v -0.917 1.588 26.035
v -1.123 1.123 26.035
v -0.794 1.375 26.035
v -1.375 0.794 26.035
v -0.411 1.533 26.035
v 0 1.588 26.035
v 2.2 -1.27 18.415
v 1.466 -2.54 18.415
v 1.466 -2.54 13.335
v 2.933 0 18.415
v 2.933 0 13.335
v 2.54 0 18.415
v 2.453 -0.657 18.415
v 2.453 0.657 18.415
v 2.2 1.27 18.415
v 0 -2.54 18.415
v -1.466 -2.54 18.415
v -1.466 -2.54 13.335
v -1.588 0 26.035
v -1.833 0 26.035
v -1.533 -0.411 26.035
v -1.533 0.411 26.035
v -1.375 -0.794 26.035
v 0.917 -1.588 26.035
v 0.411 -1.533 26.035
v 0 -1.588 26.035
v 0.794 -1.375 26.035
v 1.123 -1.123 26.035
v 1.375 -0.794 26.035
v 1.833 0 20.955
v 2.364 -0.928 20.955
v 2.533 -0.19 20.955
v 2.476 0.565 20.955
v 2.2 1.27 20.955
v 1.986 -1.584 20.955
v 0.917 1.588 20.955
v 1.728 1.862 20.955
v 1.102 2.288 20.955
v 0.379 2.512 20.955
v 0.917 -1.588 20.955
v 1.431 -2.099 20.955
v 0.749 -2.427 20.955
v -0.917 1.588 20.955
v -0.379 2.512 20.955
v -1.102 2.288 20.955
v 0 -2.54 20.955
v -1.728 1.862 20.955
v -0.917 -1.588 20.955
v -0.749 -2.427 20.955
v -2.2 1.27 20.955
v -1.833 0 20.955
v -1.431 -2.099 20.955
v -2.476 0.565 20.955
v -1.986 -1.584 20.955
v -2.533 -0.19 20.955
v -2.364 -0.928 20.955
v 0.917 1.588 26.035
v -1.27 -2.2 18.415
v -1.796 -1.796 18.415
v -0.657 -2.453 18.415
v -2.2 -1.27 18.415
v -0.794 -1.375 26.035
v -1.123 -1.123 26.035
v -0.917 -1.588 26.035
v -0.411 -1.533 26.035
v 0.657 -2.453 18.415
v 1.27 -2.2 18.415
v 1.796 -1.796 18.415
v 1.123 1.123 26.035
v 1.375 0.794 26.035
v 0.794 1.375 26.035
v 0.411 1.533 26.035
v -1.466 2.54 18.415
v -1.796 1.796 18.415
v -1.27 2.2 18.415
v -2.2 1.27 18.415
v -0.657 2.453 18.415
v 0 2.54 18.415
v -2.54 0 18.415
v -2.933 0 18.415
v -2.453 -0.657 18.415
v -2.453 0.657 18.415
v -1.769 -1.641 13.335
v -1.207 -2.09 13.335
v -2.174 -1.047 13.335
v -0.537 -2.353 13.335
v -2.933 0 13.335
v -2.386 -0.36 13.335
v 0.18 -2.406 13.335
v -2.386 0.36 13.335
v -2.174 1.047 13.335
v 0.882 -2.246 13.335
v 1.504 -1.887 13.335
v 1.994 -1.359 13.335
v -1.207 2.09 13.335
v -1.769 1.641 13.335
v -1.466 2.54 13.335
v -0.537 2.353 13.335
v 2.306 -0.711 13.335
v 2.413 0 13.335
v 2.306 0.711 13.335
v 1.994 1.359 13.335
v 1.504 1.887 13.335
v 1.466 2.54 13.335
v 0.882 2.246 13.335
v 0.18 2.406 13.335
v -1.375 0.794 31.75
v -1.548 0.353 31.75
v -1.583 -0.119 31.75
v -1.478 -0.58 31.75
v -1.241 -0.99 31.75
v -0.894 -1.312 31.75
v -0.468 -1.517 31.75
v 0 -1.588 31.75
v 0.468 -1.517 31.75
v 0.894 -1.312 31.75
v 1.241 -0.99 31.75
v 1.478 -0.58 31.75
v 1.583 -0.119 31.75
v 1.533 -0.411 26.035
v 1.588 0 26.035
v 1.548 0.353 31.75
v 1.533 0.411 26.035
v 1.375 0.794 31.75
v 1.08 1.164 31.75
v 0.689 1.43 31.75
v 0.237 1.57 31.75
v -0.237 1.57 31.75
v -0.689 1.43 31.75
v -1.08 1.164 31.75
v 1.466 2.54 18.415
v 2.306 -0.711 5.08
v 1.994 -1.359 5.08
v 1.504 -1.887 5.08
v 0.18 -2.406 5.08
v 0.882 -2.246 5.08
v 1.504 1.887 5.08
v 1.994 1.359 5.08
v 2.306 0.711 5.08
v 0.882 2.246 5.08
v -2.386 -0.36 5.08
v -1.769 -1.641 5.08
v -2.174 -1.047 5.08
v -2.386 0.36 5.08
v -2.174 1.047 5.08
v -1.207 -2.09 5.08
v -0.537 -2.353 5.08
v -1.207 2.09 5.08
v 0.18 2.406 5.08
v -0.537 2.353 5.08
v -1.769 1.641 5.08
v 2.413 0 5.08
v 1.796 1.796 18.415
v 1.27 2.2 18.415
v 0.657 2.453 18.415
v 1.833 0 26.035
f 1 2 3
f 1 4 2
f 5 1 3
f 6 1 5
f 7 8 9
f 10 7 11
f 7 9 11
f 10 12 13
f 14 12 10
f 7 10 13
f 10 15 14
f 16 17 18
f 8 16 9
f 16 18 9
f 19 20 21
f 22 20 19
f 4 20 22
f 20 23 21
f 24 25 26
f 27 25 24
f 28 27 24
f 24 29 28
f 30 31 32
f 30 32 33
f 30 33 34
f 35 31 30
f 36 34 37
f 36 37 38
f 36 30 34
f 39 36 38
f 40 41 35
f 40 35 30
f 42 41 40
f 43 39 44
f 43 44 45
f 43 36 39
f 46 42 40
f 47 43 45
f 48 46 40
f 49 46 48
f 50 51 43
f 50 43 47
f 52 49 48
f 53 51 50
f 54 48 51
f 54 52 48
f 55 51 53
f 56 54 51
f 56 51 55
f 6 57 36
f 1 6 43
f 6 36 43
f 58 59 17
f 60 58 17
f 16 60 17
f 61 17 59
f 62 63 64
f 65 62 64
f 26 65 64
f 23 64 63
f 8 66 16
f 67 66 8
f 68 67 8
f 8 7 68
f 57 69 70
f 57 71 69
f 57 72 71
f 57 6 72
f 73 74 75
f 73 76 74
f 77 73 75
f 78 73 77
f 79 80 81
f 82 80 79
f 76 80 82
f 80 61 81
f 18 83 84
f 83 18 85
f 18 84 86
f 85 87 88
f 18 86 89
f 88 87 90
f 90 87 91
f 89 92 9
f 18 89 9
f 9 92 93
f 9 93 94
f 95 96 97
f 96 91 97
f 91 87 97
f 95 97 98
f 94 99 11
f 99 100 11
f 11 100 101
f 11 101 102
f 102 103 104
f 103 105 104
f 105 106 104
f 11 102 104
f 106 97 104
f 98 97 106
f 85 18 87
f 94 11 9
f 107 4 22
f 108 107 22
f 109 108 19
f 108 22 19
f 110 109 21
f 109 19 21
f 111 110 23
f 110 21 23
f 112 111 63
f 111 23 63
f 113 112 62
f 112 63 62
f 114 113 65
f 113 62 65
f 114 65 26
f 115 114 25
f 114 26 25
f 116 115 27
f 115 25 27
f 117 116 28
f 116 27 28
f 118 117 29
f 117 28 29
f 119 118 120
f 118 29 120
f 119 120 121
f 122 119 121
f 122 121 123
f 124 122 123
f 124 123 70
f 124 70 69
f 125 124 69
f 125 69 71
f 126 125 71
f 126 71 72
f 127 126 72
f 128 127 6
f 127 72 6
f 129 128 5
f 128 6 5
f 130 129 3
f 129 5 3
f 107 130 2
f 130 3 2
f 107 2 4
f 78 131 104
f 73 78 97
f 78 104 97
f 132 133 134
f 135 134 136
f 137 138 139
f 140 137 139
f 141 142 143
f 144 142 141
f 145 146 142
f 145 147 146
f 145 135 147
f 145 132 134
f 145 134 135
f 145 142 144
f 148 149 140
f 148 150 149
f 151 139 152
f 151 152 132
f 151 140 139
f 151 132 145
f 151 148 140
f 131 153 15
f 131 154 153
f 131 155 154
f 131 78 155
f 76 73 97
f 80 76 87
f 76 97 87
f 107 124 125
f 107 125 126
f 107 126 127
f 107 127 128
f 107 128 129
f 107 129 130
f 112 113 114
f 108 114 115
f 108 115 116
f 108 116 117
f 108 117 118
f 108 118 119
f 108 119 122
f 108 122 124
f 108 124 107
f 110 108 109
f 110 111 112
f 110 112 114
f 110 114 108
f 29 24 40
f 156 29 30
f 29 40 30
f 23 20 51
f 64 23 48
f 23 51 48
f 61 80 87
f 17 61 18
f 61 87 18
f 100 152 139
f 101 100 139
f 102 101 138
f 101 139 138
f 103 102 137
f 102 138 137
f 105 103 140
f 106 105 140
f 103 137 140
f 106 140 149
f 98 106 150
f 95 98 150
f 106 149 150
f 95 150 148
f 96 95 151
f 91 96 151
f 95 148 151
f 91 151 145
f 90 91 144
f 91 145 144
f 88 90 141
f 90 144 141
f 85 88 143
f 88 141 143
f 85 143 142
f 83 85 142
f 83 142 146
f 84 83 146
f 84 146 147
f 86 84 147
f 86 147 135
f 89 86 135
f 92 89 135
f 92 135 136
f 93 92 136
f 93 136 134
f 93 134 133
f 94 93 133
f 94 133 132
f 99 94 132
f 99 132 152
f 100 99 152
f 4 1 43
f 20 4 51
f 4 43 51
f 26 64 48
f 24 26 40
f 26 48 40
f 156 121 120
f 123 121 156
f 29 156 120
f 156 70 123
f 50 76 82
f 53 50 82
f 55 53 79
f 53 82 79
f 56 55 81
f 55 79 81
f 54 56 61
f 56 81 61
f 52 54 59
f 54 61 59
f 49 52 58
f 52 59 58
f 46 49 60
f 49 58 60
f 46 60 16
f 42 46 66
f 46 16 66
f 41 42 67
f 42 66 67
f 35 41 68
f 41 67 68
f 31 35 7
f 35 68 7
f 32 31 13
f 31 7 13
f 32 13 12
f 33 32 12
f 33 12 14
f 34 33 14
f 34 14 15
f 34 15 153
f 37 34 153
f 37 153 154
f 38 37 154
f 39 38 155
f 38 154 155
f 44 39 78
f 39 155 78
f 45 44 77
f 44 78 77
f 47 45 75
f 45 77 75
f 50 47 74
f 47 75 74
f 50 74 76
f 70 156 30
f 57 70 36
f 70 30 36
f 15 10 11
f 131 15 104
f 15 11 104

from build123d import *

# Parameters (mm, degrees)
SKETCH1_R           = 2.413
BOSS_EXTRUDE1_DEPTH = 13.335
BOSS_EXTRUDE2_DEPTH = 5.08
SKETCH3_R           = 2.413
CUT_EXTRUDE1_DEPTH  = 1.905
SKETCH4_R           = 2.54
BOSS_EXTRUDE3_DEPTH = 2.54
BOSS_EXTRUDE4_DEPTH = 5.08
SKETCH6_R           = 1.5875
BOSS_EXTRUDE5_DEPTH = 5.715
SKETCH7_R           = 2.413
CUT_EXTRUDE2_DEPTH  = 3.175


with BuildPart() as part:
    # Sketch1 → Boss-Extrude1 (new body)
    with BuildSketch(Plane.XY):
        Circle(SKETCH1_R)
    extrude(amount=BOSS_EXTRUDE1_DEPTH)

    # Sketch2 → Boss-Extrude2 (add)
    with BuildSketch(Plane.XY.offset(13.335)):
        Polygon((2.932939367, 0), (1.466469684, 2.54), (-1.466469684, 2.54), (-2.932939367, 0), (-1.466469684, -2.54), (1.466469684, -2.54), align=None)
    extrude(amount=BOSS_EXTRUDE2_DEPTH)

    # Sketch3 → Cut-Extrude1 (cut)
    with BuildSketch(Plane(origin=(0, 0, 0), x_dir=(-1, 0, 0), z_dir=(0, 0, -1))):
        Circle(SKETCH3_R)
    extrude(amount=-CUT_EXTRUDE1_DEPTH, mode=Mode.SUBTRACT)

    # Sketch4 → Boss-Extrude3 (add)
    with BuildSketch(Plane.XY.offset(18.415)):
        with Locations(Location((0, 0, 0), (0, 0, 150))):
            Circle(SKETCH4_R)
    extrude(amount=BOSS_EXTRUDE3_DEPTH)

    # Sketch5 → Boss-Extrude4 (add)
    with BuildSketch(Plane.XY.offset(20.955)):
        Polygon((1.833087105, 0), (0.916543552, 1.5875), (-0.916543552, 1.5875), (-1.833087105, 0), (-0.916543552, -1.5875), (0.916543552, -1.5875), align=None)
    extrude(amount=BOSS_EXTRUDE4_DEPTH)

    # Sketch6 → Boss-Extrude5 (add)
    with BuildSketch(Plane.XY.offset(26.035)):
        with Locations(Location((0, 0, 0), (0, 0, 150))):
            Circle(SKETCH6_R)
    extrude(amount=BOSS_EXTRUDE5_DEPTH)

    # Sketch7 → Cut-Extrude2 (cut)
    with BuildSketch(Plane(origin=(0, 0, 1.905), x_dir=(-1, 0, 0), z_dir=(0, 0, -1))):
        Circle(SKETCH7_R)
    extrude(amount=-CUT_EXTRUDE2_DEPTH, mode=Mode.SUBTRACT)


solid = part.part
